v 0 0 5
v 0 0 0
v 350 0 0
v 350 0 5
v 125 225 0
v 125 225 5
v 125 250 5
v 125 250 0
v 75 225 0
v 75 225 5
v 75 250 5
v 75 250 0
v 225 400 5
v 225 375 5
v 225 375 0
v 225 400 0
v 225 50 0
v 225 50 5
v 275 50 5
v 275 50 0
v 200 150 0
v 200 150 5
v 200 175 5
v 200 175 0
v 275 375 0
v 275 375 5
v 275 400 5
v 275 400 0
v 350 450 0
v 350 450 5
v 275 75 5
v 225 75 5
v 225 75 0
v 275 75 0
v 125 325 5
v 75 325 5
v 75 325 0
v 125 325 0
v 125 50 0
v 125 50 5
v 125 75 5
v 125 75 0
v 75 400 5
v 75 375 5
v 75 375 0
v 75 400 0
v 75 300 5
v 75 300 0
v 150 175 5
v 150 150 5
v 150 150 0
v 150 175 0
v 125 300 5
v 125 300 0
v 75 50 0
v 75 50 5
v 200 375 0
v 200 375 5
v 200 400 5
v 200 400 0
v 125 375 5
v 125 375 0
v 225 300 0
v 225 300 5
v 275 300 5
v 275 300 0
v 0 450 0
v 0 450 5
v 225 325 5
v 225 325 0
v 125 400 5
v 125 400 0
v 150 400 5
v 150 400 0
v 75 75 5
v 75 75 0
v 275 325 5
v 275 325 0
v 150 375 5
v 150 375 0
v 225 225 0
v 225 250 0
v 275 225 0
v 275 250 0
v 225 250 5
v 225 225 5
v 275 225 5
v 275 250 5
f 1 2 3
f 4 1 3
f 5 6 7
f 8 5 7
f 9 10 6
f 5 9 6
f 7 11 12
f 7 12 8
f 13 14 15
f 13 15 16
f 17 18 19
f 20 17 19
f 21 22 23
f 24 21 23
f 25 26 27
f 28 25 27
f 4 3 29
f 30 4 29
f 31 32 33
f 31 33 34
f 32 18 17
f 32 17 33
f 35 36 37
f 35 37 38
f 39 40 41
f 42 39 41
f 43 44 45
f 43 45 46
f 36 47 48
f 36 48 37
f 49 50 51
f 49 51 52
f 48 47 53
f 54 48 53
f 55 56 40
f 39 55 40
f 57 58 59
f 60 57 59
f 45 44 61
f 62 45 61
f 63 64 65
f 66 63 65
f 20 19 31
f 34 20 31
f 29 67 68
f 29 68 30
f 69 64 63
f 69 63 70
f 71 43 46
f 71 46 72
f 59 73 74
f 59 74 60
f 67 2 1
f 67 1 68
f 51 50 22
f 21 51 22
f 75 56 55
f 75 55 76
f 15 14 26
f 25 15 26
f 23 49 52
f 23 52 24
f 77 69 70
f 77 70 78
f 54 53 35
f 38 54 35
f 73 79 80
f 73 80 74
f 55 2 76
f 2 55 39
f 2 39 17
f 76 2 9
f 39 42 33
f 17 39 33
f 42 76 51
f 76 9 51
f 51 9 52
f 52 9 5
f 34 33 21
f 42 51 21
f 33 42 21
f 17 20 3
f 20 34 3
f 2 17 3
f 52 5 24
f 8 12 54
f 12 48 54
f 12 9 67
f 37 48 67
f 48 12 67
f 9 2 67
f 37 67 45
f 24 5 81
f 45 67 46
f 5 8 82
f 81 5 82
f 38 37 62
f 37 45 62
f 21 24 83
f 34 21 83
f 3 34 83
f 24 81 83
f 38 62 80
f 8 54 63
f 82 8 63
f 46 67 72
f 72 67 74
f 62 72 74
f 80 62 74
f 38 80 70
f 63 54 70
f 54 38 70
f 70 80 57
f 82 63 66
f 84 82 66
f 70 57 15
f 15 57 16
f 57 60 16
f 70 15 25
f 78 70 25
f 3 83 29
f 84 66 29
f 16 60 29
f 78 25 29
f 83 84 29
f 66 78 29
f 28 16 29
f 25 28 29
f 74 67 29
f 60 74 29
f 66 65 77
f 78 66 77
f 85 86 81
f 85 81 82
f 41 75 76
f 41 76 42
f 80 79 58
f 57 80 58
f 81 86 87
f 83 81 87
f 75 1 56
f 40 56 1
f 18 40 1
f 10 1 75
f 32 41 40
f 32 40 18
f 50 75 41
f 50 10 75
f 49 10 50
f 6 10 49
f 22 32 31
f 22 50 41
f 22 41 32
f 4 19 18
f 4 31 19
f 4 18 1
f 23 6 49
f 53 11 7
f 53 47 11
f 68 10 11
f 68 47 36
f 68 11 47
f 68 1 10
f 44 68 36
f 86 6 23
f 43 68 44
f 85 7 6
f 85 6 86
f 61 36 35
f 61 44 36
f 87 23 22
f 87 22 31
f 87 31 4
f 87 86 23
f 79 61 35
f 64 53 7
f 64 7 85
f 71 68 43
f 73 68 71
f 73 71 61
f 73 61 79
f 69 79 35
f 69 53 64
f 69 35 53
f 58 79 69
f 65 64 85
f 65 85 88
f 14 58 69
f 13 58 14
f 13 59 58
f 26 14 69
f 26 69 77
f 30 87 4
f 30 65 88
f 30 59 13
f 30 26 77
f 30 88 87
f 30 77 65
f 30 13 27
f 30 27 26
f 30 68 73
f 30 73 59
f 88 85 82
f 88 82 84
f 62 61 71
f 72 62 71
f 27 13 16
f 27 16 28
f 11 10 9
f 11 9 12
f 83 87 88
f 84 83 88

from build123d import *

# Parameters (mm, degrees)
SKETCH1_W           = 350
SKETCH1_H           = 450
BOSS_EXTRUDE1_DEPTH = 5
SKETCH2_W           = 50
SKETCH2_H           = 25
CUT_EXTRUDE1_DEPTH  = 571.109638578


with BuildPart() as part:
    # Sketch1 → Boss-Extrude1 (new body)
    with BuildSketch(Plane.XY):
        with Locations((175, 225)):
            Rectangle(SKETCH1_W, SKETCH1_H)
    extrude(amount=BOSS_EXTRUDE1_DEPTH)

    # Sketch2 → Cut-Extrude1 (cut, through all)
    with BuildSketch(Plane.XY.offset(5)):
        with Locations((100, 387.5)):
            Rectangle(SKETCH2_W, SKETCH2_H)
    cut_extrude1 = extrude(amount=-CUT_EXTRUDE1_DEPTH, mode=Mode.SUBTRACT)

    # Sketch-Pattern1: Cut-Extrude1 at 9 more places
    with Locations((75, 0, 0), (150, 0, 0), (0, -75, 0), (0, -150, 0), (0, -325, 0), (150, -75, 0), (150, -150, 0), (75, -225, 0), (150, -325, 0)):
        add(cut_extrude1, mode=Mode.SUBTRACT)


solid = part.part
